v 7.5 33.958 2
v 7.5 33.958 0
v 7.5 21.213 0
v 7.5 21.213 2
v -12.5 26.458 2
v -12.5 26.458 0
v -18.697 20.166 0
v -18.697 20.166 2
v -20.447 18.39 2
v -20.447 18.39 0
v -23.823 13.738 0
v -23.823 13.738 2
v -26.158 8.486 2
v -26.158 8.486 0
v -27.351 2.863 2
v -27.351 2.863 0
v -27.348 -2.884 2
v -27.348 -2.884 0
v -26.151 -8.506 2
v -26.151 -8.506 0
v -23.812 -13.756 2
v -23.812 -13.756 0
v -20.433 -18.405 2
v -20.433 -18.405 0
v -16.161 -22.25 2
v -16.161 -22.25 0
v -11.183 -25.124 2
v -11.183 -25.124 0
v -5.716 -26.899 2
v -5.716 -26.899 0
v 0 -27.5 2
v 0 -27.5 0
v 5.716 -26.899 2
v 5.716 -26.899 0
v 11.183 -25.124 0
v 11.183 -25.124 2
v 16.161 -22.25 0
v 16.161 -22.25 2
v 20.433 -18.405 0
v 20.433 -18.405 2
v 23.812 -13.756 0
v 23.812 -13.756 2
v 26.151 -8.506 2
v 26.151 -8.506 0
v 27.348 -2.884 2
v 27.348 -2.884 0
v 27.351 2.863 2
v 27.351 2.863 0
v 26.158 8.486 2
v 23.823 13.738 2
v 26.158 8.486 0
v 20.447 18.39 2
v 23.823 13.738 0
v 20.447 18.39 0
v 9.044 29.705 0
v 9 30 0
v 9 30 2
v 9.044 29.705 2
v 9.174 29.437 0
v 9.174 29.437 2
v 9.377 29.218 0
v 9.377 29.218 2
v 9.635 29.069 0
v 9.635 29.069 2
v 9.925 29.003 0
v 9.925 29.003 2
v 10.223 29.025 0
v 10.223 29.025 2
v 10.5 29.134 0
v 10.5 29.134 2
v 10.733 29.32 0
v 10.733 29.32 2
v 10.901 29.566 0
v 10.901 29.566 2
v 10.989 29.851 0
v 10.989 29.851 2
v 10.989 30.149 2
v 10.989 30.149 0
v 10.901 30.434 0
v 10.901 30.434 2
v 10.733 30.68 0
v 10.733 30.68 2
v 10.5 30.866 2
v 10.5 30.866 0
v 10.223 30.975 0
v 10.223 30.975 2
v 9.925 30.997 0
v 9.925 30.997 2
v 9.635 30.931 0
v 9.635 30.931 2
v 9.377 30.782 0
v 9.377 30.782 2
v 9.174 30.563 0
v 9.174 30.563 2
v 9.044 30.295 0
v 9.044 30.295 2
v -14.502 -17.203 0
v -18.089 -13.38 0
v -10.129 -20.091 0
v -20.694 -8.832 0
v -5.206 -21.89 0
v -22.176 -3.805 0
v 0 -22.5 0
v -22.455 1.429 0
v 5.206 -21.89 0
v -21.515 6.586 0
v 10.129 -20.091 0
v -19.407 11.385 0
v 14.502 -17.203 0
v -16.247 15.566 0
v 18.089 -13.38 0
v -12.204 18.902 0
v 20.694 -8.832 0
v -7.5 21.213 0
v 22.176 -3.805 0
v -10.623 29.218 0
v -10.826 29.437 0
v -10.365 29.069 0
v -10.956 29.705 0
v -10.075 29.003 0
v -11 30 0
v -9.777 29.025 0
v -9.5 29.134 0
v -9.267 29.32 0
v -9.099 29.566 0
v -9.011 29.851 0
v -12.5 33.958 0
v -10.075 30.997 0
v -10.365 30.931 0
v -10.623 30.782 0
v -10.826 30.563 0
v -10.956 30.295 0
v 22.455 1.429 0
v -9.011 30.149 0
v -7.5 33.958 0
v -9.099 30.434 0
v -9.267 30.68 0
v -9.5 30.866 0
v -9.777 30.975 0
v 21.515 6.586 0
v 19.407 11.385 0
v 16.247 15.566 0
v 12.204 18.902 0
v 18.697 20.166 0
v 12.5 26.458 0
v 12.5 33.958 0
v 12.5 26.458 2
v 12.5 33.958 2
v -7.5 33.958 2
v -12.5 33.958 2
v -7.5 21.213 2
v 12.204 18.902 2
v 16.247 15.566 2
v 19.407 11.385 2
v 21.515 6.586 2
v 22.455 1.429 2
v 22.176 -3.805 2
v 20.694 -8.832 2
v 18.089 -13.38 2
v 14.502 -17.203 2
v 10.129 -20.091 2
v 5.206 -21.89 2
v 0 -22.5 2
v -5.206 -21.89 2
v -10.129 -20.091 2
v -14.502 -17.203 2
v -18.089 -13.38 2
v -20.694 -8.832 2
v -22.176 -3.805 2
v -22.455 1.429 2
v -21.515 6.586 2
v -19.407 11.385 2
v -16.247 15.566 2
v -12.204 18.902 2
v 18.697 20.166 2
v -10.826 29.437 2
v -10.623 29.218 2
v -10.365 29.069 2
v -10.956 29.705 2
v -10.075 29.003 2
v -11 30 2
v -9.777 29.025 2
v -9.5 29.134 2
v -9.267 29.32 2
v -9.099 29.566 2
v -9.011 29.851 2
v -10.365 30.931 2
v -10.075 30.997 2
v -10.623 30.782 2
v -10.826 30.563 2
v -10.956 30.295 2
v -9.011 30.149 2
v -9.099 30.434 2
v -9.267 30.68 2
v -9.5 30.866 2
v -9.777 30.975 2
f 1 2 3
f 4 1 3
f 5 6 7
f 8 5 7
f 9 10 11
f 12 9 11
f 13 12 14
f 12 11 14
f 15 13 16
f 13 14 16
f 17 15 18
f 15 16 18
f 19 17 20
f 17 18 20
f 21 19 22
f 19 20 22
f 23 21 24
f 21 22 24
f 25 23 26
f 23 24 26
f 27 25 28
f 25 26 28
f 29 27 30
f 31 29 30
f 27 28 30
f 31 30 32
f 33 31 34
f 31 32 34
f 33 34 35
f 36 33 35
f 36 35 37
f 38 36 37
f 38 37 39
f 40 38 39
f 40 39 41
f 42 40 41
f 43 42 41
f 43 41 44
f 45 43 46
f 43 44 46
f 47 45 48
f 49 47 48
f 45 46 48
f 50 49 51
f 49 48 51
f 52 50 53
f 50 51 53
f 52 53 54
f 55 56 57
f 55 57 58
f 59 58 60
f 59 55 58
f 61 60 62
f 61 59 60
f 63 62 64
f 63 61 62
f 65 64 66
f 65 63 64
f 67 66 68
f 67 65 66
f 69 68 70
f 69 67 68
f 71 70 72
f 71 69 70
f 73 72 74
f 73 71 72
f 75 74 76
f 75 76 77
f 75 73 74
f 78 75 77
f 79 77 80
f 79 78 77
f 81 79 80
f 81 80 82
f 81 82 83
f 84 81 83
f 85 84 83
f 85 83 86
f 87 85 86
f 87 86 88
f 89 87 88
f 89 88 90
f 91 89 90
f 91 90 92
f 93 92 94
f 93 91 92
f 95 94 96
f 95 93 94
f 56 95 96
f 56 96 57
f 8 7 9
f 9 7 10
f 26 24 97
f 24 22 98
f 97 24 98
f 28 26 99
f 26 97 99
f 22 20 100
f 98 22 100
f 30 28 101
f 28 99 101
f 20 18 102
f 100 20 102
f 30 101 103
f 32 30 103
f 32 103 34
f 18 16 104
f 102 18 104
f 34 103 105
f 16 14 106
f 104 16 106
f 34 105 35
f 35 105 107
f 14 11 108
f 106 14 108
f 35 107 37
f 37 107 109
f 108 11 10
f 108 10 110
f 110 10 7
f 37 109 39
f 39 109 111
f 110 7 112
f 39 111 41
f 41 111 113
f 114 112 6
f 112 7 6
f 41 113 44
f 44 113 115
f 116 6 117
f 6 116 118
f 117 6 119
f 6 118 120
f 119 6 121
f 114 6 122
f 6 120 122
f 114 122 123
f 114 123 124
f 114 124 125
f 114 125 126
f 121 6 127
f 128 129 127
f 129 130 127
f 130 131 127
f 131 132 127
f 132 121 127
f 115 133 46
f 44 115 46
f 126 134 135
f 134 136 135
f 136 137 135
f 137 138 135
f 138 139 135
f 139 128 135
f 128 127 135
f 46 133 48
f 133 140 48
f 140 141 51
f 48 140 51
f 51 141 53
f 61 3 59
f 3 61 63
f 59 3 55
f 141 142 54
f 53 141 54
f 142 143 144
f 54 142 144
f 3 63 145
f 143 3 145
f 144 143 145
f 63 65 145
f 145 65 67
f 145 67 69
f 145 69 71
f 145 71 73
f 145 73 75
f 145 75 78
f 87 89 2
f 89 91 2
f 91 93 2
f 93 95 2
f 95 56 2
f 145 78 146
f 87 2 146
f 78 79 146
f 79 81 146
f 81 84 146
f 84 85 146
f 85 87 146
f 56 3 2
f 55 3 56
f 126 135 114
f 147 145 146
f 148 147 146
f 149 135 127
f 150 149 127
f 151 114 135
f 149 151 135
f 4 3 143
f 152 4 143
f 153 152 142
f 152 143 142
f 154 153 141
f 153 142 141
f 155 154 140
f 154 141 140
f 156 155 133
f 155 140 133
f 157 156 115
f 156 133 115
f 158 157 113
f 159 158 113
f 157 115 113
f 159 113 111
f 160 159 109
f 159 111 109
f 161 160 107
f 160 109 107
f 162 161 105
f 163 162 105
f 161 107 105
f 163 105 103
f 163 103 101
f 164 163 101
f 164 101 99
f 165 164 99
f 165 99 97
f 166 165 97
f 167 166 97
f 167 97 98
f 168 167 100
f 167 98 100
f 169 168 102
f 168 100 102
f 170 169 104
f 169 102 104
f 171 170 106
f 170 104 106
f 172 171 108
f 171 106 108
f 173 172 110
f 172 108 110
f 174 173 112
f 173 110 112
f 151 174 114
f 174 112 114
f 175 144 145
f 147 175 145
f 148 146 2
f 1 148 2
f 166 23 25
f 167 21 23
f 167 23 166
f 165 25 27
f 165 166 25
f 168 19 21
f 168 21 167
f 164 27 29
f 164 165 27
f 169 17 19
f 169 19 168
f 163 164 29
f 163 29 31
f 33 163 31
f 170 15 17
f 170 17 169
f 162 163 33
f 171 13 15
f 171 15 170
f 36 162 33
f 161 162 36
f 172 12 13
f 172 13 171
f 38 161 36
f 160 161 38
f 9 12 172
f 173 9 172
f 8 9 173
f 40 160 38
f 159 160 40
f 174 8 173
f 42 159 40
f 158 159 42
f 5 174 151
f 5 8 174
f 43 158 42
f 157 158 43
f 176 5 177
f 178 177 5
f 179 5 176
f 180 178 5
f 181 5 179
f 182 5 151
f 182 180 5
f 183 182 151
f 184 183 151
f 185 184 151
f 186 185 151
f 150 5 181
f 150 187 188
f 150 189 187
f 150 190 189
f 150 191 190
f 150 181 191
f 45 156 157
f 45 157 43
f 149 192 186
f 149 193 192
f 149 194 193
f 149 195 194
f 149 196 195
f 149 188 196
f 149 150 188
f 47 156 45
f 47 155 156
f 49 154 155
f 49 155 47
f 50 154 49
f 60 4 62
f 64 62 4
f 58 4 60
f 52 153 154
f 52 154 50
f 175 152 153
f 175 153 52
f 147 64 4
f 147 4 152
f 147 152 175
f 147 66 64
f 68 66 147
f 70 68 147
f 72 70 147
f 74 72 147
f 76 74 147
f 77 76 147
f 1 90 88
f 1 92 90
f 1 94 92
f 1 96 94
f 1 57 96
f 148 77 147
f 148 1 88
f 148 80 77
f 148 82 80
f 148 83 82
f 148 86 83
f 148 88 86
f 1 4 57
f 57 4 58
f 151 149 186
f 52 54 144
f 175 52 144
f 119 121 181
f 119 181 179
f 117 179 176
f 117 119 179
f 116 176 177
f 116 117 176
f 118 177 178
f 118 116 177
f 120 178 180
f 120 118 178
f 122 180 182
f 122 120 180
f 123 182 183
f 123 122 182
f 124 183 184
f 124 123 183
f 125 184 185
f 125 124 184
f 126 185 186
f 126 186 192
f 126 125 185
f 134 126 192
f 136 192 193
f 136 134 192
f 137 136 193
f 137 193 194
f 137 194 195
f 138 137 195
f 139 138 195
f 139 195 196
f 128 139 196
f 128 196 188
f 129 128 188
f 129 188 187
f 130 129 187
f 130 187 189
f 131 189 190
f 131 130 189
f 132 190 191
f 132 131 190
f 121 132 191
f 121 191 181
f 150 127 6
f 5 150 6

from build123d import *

# Parameters (mm, degrees)
SKETCH1_R      = 1
EXTRUDE1_DEPTH = 2


with BuildPart() as part:
    # Sketch1 → Extrude1 (new body)
    with BuildSketch(Plane.XY):
        with BuildLine():
            Line((-12.5, 33.957513111), (-12.5, 26.457513111))
            Line((-12.5, 26.457513111), (-18.696787712, 20.166311741))
            Line((-18.696787712, 20.166311741), (-20.446699126, 18.389738847))
            ThreePointArc((-20.446699126, 18.389738847), (0, -27.5), (20.446699126, 18.389738847))
            Line((20.446699126, 18.389738847), (18.696787712, 20.166311741))
            Line((18.696787712, 20.166311741), (12.5, 26.457513111))
            Line((12.5, 26.457513111), (12.5, 33.957513111))
            Line((12.5, 33.957513111), (7.5, 33.957513111))
            Line((7.5, 33.957513111), (7.5, 21.213203436))
            ThreePointArc((7.5, 21.213203436), (0, -22.5), (-7.5, 21.213203436))
            Line((-7.5, 21.213203436), (-7.5, 33.957513111))
            Line((-7.5, 33.957513111), (-12.5, 33.957513111))
        make_face()
        with Locations(Location((-10, 30, 0), (0, 0, 180))):
            Circle(SKETCH1_R, mode=Mode.SUBTRACT)
        with Locations(Location((10, 30, 0), (0, 0, 180))):
            Circle(SKETCH1_R, mode=Mode.SUBTRACT)
    extrude(amount=EXTRUDE1_DEPTH)


solid = part.part
